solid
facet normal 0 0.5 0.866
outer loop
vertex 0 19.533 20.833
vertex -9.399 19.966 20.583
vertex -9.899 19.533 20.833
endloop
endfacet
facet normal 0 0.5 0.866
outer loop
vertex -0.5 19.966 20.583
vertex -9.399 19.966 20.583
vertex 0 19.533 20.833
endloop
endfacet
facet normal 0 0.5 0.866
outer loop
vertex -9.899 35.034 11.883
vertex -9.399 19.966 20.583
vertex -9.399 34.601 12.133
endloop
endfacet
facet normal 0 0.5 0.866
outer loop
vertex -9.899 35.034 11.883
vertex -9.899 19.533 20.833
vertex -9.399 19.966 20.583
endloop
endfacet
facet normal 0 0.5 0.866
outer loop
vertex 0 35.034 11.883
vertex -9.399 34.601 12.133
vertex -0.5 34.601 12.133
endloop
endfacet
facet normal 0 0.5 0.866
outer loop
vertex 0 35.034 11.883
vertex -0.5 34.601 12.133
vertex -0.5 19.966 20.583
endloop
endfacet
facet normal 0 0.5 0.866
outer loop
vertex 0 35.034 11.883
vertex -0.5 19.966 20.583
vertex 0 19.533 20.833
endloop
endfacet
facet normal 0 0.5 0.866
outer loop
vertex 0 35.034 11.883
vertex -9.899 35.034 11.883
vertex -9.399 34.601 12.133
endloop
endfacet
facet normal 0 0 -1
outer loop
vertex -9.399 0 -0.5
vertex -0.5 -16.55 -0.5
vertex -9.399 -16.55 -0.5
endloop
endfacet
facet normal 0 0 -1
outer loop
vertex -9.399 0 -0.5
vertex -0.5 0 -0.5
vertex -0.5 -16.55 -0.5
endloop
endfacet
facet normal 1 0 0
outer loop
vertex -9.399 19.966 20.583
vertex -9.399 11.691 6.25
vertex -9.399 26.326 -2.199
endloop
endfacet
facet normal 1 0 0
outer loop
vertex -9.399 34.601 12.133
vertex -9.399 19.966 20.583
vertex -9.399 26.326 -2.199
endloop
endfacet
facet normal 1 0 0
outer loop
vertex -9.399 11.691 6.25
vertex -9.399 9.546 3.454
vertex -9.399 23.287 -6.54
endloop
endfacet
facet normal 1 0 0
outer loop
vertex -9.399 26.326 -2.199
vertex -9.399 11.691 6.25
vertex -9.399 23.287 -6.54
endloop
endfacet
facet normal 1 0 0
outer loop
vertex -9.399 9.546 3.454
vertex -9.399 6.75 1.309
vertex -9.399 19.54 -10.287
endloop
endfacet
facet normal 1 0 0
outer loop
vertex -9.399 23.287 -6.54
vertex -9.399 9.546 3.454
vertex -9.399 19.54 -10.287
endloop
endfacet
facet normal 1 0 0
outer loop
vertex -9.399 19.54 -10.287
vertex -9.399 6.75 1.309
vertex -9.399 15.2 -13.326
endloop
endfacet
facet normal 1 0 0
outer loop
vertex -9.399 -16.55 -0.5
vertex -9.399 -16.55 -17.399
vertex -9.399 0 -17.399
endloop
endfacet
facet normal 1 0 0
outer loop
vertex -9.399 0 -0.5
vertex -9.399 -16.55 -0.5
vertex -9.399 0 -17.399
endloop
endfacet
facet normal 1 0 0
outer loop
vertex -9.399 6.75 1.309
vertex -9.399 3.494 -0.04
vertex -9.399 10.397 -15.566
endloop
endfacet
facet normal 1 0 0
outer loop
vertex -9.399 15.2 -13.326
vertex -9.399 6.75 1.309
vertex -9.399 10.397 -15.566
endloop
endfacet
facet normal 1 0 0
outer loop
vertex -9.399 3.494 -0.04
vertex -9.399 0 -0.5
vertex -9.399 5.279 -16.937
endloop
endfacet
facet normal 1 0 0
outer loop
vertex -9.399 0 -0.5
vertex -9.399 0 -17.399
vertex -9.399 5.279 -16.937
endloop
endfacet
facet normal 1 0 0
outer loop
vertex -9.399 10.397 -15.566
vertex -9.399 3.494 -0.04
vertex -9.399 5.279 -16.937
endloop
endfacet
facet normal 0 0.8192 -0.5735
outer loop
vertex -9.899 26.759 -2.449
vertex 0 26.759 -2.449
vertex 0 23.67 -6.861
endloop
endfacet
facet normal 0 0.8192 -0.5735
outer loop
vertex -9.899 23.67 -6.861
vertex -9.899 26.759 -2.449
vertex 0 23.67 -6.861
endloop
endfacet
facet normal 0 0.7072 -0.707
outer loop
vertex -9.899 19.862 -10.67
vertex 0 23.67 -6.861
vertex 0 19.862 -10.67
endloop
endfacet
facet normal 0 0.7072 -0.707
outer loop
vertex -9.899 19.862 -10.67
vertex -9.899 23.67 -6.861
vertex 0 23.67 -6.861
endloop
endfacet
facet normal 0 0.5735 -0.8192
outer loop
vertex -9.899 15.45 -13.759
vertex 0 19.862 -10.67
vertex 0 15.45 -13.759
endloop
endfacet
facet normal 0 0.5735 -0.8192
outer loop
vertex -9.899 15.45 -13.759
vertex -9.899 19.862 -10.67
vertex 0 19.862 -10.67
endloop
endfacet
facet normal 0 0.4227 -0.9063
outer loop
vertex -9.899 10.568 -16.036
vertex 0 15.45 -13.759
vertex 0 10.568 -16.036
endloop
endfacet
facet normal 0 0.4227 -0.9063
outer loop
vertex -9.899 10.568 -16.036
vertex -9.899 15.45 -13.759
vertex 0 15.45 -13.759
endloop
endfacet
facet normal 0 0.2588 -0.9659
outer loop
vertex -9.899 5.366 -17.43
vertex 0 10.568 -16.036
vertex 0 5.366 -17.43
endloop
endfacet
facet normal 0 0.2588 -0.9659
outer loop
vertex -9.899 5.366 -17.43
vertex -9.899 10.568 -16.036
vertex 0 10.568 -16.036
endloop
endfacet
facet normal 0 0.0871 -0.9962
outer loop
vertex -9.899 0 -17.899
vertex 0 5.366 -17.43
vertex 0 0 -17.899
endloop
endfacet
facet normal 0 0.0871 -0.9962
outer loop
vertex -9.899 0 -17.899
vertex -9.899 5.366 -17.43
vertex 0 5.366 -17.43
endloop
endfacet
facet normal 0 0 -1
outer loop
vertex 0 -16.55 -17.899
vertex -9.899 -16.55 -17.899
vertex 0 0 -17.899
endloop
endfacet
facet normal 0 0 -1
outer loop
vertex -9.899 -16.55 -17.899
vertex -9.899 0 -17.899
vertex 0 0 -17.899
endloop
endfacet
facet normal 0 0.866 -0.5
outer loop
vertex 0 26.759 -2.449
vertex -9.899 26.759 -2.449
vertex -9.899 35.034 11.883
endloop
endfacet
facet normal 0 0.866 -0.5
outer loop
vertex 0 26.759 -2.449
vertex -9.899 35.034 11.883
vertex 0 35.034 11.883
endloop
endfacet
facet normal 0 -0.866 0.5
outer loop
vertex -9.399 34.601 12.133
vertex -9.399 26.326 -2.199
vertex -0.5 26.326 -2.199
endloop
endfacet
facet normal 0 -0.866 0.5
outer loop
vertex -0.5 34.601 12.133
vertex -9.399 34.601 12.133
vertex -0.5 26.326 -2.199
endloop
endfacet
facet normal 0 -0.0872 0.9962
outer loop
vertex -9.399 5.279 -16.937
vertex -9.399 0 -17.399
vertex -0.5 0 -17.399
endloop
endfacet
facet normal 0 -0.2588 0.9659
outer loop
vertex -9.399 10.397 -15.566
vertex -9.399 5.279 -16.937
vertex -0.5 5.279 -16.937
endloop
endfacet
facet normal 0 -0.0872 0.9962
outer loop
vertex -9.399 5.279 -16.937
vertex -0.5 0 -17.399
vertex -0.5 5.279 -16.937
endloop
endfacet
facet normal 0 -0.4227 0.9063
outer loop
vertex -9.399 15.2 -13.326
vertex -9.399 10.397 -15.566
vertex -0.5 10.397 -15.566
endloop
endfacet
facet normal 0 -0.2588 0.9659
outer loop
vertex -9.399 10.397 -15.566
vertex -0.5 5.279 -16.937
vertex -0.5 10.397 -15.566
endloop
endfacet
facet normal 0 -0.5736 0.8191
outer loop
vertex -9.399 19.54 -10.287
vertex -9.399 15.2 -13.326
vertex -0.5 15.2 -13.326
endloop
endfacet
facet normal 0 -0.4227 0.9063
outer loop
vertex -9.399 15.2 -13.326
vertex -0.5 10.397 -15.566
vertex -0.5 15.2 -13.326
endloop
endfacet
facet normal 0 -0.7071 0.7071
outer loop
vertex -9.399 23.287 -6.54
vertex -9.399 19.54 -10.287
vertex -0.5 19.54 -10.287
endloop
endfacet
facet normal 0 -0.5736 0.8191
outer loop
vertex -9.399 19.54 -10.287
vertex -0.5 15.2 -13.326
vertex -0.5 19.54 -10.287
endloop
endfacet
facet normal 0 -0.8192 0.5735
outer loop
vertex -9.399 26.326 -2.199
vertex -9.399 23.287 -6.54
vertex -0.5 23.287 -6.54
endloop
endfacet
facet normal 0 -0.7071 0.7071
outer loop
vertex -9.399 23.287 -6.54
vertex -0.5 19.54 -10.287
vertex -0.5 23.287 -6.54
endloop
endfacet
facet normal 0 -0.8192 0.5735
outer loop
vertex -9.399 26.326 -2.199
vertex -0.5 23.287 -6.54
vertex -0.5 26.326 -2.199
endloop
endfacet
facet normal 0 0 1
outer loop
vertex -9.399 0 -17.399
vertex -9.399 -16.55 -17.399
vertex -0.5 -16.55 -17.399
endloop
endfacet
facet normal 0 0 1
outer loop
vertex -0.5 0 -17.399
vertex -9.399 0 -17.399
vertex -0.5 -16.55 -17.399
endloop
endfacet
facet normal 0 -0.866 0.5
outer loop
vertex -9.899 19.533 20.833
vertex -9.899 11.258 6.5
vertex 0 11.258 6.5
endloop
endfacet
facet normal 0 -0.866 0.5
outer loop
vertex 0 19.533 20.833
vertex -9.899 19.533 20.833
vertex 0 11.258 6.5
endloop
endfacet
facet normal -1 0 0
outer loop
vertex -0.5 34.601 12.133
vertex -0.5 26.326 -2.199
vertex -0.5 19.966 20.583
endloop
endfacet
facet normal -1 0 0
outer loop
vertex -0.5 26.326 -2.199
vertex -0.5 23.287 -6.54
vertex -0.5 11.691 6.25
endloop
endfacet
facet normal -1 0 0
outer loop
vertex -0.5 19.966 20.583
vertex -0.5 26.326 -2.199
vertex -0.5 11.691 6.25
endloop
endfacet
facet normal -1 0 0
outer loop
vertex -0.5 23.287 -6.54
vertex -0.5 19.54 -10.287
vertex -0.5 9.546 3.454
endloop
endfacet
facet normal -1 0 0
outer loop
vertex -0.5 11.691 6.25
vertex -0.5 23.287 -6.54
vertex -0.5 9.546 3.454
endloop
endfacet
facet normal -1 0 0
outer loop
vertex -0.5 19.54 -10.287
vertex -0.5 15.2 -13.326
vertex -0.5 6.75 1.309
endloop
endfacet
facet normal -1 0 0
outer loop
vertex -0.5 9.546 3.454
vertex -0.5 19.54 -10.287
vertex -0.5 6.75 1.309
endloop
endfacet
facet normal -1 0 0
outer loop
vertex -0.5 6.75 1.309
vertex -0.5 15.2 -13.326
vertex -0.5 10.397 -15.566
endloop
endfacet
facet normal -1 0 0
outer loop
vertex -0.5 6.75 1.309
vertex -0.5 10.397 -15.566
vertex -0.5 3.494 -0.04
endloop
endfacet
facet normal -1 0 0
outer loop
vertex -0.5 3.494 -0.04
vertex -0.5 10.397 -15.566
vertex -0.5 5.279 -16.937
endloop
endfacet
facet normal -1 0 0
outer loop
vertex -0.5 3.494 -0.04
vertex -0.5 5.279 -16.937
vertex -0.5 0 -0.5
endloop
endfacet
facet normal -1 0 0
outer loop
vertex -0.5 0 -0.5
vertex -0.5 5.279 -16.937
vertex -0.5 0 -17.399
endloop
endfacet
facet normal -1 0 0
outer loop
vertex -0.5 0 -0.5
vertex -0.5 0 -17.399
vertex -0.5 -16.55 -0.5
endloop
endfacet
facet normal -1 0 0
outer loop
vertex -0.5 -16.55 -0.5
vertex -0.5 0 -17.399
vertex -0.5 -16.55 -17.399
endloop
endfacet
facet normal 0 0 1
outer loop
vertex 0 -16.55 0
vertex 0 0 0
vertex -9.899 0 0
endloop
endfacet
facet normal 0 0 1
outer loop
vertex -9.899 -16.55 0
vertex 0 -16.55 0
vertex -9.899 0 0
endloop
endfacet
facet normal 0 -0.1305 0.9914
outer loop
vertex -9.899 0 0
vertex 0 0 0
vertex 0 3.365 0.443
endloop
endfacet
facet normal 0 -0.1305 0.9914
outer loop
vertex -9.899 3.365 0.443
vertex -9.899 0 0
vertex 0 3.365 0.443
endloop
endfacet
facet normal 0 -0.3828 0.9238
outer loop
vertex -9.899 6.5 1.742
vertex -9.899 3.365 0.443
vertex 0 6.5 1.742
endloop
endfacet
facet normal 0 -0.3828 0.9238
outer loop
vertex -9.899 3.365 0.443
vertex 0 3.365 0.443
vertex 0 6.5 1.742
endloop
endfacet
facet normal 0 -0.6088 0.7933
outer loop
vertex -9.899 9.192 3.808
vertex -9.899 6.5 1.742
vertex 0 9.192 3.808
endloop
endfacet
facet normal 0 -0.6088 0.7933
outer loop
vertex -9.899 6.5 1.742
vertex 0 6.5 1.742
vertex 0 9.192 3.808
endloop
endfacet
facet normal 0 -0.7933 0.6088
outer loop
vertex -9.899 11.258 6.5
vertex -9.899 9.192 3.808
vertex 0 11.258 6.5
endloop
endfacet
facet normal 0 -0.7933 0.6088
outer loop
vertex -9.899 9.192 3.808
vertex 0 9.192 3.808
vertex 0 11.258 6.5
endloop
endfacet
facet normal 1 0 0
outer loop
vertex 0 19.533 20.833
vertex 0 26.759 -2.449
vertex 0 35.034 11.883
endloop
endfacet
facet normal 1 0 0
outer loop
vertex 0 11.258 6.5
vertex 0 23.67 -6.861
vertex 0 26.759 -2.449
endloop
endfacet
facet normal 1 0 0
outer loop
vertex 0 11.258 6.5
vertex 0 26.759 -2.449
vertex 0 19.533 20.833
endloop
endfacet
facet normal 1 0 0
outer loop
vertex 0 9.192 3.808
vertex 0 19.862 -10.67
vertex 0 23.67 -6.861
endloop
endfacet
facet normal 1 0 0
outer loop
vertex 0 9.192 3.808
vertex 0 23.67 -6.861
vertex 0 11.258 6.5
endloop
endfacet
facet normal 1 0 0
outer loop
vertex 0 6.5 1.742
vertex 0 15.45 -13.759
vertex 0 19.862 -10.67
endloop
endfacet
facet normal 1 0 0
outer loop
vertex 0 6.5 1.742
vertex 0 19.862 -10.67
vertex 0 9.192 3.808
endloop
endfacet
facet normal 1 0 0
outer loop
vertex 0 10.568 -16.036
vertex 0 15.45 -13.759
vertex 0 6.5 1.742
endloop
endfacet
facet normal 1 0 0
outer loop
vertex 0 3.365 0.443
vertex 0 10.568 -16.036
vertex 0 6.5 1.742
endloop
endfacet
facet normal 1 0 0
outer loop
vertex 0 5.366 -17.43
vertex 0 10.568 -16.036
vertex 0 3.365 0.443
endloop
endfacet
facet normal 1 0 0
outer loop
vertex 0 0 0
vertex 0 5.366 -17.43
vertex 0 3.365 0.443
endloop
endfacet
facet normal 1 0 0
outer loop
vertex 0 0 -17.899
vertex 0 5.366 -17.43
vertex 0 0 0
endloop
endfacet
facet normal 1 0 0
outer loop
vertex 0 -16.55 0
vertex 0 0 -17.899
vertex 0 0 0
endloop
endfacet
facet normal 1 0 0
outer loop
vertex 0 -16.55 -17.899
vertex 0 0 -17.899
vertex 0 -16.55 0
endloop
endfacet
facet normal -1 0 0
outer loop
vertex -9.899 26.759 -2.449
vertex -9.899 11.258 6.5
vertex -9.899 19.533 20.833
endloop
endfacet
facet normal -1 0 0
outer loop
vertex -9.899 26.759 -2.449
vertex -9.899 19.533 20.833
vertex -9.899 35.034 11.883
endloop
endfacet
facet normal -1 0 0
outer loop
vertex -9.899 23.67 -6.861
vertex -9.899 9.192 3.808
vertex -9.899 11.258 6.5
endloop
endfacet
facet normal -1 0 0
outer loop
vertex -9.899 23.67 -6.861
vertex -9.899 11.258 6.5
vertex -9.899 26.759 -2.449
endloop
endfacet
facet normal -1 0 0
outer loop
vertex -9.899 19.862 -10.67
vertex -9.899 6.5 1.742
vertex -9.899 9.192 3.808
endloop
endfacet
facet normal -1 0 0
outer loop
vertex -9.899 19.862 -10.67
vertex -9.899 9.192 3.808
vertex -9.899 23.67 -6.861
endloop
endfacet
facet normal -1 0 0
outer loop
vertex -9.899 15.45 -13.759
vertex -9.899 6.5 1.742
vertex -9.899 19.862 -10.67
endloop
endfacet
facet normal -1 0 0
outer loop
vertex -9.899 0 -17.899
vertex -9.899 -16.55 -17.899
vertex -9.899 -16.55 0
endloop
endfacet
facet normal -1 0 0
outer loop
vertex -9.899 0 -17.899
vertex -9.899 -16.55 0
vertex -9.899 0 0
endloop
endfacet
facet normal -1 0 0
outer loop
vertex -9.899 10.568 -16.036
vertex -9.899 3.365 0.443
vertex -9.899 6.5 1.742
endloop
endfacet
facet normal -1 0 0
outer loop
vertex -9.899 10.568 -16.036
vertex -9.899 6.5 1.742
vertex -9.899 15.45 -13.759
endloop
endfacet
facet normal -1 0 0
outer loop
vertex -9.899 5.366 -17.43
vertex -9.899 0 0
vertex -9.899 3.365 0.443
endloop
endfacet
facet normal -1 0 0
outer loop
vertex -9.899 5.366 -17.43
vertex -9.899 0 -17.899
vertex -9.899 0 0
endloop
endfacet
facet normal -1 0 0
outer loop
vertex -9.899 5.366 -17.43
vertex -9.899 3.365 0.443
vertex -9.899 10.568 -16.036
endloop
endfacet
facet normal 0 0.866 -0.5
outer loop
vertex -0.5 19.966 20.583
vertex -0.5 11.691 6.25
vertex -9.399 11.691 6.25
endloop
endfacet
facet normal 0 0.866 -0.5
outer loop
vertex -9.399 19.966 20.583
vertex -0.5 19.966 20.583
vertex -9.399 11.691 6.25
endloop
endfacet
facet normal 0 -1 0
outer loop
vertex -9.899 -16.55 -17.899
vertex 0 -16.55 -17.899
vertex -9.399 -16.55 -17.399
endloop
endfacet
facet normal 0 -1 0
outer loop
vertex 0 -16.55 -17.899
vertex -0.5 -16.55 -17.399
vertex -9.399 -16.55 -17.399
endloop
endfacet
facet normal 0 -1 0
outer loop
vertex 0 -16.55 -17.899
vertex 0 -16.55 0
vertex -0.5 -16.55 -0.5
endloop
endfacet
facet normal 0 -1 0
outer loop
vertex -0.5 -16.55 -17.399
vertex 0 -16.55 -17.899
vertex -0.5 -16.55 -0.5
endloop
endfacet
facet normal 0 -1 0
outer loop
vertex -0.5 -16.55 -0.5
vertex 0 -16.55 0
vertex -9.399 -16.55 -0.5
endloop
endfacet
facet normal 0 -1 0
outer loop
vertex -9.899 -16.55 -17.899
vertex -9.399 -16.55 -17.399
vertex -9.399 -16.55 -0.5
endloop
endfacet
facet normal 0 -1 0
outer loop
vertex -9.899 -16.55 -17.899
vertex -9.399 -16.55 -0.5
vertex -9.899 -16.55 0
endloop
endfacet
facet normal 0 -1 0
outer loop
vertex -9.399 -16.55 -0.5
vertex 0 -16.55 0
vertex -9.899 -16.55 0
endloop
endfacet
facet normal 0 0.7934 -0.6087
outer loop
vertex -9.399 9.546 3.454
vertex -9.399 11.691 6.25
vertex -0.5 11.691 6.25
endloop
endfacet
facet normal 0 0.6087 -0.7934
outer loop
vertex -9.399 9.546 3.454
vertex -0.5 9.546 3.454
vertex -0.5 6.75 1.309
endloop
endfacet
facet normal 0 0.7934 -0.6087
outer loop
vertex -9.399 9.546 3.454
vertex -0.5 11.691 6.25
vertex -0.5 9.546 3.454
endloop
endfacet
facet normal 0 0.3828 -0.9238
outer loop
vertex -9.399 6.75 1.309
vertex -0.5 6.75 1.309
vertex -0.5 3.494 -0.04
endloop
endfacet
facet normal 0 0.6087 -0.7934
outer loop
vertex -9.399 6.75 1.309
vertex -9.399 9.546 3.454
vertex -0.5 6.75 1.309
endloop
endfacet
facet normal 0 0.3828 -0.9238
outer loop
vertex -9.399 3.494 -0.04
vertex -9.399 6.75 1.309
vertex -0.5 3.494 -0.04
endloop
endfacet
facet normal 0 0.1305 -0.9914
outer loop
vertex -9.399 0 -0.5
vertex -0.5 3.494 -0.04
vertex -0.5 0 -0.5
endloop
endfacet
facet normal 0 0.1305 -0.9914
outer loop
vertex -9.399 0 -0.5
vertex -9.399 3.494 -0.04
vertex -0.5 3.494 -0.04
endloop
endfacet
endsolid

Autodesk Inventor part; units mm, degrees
ref_plane "YZ Plane" through (0, 0, 0) normal (1, 0, 0) x (0, 1, 0)
ref_plane "XZ Plane" through (0, 0, 0) normal (0, 1, 0) x (-1, 0, 0)
ref_plane "XY Plane" through (0, 0, 0) normal (0, 0, 1) x (1, 0, 0)
sketch "Sketch1" plane through (0, 0, 0) normal (0, 1, 0) x (-1, 0, 0)
  line L0 (0, 0) -> (9.899, 0)
  line L1 (9.899, 0) -> (9.899, -17.899)
  line L2 (9.899, -17.899) -> (0, -17.899)
  line L3 (0, -17.899) -> (0, 0)
  line L4 (0.5, -0.5) -> (9.399, -0.5)
  line L5 (9.399, -0.5) -> (9.399, -17.399)
  line L6 (9.399, -17.399) -> (0.5, -17.399)
  line L7 (0.5, -17.399) -> (0.5, -0.5)
  dimension "d0" = 9.899
  dimension "d1" = 17.899
  dimension "d2" = 16.899
  dimension "d3" = 8.899
  dimension "d4" = 0.5
  dimension "d5" = 0.5
sketch "Sketch3" plane through (0, 0, 0) normal (1, 0, 0) x (0, 1, 0)
  arc A0 (0, 0) -> (11.2583, 6.5) centre (0, 13) ccw
  line L0 (0, 13) -> (11.2583, 6.5) construction
  line L1 (0, 13) -> (0, 0) construction
  dimension "d6" = 60
  dimension "d7" = 13
sweep "Sweep1" add profiles "Sketch1" path "Sketch3"
extrude "Extrusion1" add sketch "Sketch1" against normal blind 16.55
ref_plane "Work Plane1" through (-9.899, 11.2583, 6.5) normal (0, 0.5, 0.866) x (1, 0, 0)
sketch "Sketch4" plane through (-9.899, 11.2583, 6.5) normal (0, 0.5, 0.866) x (1, 0, 0)
  line L0 (0, 0) -> (9.899, 0)
  line L1 (0, 0) -> (0, 17.899)
  line L2 (0, 17.899) -> (9.899, 17.899)
  line L3 (9.899, 17.899) -> (9.899, 0)
  line L4 (0.5, 17.399) -> (9.399, 17.399)
  line L5 (9.399, 17.399) -> (9.399, 0.5)
  line L6 (9.399, 0.5) -> (0.5, 0.5)
  line L7 (9.399, 0.5) -> (0.5, 0.5) projected
  line L8 (0.5, 0.5) -> (0.5, 17.399)
extrude "Extrusion2" add sketch "Sketch4" along normal blind 16.55
properties part number "curved waveguide120"
